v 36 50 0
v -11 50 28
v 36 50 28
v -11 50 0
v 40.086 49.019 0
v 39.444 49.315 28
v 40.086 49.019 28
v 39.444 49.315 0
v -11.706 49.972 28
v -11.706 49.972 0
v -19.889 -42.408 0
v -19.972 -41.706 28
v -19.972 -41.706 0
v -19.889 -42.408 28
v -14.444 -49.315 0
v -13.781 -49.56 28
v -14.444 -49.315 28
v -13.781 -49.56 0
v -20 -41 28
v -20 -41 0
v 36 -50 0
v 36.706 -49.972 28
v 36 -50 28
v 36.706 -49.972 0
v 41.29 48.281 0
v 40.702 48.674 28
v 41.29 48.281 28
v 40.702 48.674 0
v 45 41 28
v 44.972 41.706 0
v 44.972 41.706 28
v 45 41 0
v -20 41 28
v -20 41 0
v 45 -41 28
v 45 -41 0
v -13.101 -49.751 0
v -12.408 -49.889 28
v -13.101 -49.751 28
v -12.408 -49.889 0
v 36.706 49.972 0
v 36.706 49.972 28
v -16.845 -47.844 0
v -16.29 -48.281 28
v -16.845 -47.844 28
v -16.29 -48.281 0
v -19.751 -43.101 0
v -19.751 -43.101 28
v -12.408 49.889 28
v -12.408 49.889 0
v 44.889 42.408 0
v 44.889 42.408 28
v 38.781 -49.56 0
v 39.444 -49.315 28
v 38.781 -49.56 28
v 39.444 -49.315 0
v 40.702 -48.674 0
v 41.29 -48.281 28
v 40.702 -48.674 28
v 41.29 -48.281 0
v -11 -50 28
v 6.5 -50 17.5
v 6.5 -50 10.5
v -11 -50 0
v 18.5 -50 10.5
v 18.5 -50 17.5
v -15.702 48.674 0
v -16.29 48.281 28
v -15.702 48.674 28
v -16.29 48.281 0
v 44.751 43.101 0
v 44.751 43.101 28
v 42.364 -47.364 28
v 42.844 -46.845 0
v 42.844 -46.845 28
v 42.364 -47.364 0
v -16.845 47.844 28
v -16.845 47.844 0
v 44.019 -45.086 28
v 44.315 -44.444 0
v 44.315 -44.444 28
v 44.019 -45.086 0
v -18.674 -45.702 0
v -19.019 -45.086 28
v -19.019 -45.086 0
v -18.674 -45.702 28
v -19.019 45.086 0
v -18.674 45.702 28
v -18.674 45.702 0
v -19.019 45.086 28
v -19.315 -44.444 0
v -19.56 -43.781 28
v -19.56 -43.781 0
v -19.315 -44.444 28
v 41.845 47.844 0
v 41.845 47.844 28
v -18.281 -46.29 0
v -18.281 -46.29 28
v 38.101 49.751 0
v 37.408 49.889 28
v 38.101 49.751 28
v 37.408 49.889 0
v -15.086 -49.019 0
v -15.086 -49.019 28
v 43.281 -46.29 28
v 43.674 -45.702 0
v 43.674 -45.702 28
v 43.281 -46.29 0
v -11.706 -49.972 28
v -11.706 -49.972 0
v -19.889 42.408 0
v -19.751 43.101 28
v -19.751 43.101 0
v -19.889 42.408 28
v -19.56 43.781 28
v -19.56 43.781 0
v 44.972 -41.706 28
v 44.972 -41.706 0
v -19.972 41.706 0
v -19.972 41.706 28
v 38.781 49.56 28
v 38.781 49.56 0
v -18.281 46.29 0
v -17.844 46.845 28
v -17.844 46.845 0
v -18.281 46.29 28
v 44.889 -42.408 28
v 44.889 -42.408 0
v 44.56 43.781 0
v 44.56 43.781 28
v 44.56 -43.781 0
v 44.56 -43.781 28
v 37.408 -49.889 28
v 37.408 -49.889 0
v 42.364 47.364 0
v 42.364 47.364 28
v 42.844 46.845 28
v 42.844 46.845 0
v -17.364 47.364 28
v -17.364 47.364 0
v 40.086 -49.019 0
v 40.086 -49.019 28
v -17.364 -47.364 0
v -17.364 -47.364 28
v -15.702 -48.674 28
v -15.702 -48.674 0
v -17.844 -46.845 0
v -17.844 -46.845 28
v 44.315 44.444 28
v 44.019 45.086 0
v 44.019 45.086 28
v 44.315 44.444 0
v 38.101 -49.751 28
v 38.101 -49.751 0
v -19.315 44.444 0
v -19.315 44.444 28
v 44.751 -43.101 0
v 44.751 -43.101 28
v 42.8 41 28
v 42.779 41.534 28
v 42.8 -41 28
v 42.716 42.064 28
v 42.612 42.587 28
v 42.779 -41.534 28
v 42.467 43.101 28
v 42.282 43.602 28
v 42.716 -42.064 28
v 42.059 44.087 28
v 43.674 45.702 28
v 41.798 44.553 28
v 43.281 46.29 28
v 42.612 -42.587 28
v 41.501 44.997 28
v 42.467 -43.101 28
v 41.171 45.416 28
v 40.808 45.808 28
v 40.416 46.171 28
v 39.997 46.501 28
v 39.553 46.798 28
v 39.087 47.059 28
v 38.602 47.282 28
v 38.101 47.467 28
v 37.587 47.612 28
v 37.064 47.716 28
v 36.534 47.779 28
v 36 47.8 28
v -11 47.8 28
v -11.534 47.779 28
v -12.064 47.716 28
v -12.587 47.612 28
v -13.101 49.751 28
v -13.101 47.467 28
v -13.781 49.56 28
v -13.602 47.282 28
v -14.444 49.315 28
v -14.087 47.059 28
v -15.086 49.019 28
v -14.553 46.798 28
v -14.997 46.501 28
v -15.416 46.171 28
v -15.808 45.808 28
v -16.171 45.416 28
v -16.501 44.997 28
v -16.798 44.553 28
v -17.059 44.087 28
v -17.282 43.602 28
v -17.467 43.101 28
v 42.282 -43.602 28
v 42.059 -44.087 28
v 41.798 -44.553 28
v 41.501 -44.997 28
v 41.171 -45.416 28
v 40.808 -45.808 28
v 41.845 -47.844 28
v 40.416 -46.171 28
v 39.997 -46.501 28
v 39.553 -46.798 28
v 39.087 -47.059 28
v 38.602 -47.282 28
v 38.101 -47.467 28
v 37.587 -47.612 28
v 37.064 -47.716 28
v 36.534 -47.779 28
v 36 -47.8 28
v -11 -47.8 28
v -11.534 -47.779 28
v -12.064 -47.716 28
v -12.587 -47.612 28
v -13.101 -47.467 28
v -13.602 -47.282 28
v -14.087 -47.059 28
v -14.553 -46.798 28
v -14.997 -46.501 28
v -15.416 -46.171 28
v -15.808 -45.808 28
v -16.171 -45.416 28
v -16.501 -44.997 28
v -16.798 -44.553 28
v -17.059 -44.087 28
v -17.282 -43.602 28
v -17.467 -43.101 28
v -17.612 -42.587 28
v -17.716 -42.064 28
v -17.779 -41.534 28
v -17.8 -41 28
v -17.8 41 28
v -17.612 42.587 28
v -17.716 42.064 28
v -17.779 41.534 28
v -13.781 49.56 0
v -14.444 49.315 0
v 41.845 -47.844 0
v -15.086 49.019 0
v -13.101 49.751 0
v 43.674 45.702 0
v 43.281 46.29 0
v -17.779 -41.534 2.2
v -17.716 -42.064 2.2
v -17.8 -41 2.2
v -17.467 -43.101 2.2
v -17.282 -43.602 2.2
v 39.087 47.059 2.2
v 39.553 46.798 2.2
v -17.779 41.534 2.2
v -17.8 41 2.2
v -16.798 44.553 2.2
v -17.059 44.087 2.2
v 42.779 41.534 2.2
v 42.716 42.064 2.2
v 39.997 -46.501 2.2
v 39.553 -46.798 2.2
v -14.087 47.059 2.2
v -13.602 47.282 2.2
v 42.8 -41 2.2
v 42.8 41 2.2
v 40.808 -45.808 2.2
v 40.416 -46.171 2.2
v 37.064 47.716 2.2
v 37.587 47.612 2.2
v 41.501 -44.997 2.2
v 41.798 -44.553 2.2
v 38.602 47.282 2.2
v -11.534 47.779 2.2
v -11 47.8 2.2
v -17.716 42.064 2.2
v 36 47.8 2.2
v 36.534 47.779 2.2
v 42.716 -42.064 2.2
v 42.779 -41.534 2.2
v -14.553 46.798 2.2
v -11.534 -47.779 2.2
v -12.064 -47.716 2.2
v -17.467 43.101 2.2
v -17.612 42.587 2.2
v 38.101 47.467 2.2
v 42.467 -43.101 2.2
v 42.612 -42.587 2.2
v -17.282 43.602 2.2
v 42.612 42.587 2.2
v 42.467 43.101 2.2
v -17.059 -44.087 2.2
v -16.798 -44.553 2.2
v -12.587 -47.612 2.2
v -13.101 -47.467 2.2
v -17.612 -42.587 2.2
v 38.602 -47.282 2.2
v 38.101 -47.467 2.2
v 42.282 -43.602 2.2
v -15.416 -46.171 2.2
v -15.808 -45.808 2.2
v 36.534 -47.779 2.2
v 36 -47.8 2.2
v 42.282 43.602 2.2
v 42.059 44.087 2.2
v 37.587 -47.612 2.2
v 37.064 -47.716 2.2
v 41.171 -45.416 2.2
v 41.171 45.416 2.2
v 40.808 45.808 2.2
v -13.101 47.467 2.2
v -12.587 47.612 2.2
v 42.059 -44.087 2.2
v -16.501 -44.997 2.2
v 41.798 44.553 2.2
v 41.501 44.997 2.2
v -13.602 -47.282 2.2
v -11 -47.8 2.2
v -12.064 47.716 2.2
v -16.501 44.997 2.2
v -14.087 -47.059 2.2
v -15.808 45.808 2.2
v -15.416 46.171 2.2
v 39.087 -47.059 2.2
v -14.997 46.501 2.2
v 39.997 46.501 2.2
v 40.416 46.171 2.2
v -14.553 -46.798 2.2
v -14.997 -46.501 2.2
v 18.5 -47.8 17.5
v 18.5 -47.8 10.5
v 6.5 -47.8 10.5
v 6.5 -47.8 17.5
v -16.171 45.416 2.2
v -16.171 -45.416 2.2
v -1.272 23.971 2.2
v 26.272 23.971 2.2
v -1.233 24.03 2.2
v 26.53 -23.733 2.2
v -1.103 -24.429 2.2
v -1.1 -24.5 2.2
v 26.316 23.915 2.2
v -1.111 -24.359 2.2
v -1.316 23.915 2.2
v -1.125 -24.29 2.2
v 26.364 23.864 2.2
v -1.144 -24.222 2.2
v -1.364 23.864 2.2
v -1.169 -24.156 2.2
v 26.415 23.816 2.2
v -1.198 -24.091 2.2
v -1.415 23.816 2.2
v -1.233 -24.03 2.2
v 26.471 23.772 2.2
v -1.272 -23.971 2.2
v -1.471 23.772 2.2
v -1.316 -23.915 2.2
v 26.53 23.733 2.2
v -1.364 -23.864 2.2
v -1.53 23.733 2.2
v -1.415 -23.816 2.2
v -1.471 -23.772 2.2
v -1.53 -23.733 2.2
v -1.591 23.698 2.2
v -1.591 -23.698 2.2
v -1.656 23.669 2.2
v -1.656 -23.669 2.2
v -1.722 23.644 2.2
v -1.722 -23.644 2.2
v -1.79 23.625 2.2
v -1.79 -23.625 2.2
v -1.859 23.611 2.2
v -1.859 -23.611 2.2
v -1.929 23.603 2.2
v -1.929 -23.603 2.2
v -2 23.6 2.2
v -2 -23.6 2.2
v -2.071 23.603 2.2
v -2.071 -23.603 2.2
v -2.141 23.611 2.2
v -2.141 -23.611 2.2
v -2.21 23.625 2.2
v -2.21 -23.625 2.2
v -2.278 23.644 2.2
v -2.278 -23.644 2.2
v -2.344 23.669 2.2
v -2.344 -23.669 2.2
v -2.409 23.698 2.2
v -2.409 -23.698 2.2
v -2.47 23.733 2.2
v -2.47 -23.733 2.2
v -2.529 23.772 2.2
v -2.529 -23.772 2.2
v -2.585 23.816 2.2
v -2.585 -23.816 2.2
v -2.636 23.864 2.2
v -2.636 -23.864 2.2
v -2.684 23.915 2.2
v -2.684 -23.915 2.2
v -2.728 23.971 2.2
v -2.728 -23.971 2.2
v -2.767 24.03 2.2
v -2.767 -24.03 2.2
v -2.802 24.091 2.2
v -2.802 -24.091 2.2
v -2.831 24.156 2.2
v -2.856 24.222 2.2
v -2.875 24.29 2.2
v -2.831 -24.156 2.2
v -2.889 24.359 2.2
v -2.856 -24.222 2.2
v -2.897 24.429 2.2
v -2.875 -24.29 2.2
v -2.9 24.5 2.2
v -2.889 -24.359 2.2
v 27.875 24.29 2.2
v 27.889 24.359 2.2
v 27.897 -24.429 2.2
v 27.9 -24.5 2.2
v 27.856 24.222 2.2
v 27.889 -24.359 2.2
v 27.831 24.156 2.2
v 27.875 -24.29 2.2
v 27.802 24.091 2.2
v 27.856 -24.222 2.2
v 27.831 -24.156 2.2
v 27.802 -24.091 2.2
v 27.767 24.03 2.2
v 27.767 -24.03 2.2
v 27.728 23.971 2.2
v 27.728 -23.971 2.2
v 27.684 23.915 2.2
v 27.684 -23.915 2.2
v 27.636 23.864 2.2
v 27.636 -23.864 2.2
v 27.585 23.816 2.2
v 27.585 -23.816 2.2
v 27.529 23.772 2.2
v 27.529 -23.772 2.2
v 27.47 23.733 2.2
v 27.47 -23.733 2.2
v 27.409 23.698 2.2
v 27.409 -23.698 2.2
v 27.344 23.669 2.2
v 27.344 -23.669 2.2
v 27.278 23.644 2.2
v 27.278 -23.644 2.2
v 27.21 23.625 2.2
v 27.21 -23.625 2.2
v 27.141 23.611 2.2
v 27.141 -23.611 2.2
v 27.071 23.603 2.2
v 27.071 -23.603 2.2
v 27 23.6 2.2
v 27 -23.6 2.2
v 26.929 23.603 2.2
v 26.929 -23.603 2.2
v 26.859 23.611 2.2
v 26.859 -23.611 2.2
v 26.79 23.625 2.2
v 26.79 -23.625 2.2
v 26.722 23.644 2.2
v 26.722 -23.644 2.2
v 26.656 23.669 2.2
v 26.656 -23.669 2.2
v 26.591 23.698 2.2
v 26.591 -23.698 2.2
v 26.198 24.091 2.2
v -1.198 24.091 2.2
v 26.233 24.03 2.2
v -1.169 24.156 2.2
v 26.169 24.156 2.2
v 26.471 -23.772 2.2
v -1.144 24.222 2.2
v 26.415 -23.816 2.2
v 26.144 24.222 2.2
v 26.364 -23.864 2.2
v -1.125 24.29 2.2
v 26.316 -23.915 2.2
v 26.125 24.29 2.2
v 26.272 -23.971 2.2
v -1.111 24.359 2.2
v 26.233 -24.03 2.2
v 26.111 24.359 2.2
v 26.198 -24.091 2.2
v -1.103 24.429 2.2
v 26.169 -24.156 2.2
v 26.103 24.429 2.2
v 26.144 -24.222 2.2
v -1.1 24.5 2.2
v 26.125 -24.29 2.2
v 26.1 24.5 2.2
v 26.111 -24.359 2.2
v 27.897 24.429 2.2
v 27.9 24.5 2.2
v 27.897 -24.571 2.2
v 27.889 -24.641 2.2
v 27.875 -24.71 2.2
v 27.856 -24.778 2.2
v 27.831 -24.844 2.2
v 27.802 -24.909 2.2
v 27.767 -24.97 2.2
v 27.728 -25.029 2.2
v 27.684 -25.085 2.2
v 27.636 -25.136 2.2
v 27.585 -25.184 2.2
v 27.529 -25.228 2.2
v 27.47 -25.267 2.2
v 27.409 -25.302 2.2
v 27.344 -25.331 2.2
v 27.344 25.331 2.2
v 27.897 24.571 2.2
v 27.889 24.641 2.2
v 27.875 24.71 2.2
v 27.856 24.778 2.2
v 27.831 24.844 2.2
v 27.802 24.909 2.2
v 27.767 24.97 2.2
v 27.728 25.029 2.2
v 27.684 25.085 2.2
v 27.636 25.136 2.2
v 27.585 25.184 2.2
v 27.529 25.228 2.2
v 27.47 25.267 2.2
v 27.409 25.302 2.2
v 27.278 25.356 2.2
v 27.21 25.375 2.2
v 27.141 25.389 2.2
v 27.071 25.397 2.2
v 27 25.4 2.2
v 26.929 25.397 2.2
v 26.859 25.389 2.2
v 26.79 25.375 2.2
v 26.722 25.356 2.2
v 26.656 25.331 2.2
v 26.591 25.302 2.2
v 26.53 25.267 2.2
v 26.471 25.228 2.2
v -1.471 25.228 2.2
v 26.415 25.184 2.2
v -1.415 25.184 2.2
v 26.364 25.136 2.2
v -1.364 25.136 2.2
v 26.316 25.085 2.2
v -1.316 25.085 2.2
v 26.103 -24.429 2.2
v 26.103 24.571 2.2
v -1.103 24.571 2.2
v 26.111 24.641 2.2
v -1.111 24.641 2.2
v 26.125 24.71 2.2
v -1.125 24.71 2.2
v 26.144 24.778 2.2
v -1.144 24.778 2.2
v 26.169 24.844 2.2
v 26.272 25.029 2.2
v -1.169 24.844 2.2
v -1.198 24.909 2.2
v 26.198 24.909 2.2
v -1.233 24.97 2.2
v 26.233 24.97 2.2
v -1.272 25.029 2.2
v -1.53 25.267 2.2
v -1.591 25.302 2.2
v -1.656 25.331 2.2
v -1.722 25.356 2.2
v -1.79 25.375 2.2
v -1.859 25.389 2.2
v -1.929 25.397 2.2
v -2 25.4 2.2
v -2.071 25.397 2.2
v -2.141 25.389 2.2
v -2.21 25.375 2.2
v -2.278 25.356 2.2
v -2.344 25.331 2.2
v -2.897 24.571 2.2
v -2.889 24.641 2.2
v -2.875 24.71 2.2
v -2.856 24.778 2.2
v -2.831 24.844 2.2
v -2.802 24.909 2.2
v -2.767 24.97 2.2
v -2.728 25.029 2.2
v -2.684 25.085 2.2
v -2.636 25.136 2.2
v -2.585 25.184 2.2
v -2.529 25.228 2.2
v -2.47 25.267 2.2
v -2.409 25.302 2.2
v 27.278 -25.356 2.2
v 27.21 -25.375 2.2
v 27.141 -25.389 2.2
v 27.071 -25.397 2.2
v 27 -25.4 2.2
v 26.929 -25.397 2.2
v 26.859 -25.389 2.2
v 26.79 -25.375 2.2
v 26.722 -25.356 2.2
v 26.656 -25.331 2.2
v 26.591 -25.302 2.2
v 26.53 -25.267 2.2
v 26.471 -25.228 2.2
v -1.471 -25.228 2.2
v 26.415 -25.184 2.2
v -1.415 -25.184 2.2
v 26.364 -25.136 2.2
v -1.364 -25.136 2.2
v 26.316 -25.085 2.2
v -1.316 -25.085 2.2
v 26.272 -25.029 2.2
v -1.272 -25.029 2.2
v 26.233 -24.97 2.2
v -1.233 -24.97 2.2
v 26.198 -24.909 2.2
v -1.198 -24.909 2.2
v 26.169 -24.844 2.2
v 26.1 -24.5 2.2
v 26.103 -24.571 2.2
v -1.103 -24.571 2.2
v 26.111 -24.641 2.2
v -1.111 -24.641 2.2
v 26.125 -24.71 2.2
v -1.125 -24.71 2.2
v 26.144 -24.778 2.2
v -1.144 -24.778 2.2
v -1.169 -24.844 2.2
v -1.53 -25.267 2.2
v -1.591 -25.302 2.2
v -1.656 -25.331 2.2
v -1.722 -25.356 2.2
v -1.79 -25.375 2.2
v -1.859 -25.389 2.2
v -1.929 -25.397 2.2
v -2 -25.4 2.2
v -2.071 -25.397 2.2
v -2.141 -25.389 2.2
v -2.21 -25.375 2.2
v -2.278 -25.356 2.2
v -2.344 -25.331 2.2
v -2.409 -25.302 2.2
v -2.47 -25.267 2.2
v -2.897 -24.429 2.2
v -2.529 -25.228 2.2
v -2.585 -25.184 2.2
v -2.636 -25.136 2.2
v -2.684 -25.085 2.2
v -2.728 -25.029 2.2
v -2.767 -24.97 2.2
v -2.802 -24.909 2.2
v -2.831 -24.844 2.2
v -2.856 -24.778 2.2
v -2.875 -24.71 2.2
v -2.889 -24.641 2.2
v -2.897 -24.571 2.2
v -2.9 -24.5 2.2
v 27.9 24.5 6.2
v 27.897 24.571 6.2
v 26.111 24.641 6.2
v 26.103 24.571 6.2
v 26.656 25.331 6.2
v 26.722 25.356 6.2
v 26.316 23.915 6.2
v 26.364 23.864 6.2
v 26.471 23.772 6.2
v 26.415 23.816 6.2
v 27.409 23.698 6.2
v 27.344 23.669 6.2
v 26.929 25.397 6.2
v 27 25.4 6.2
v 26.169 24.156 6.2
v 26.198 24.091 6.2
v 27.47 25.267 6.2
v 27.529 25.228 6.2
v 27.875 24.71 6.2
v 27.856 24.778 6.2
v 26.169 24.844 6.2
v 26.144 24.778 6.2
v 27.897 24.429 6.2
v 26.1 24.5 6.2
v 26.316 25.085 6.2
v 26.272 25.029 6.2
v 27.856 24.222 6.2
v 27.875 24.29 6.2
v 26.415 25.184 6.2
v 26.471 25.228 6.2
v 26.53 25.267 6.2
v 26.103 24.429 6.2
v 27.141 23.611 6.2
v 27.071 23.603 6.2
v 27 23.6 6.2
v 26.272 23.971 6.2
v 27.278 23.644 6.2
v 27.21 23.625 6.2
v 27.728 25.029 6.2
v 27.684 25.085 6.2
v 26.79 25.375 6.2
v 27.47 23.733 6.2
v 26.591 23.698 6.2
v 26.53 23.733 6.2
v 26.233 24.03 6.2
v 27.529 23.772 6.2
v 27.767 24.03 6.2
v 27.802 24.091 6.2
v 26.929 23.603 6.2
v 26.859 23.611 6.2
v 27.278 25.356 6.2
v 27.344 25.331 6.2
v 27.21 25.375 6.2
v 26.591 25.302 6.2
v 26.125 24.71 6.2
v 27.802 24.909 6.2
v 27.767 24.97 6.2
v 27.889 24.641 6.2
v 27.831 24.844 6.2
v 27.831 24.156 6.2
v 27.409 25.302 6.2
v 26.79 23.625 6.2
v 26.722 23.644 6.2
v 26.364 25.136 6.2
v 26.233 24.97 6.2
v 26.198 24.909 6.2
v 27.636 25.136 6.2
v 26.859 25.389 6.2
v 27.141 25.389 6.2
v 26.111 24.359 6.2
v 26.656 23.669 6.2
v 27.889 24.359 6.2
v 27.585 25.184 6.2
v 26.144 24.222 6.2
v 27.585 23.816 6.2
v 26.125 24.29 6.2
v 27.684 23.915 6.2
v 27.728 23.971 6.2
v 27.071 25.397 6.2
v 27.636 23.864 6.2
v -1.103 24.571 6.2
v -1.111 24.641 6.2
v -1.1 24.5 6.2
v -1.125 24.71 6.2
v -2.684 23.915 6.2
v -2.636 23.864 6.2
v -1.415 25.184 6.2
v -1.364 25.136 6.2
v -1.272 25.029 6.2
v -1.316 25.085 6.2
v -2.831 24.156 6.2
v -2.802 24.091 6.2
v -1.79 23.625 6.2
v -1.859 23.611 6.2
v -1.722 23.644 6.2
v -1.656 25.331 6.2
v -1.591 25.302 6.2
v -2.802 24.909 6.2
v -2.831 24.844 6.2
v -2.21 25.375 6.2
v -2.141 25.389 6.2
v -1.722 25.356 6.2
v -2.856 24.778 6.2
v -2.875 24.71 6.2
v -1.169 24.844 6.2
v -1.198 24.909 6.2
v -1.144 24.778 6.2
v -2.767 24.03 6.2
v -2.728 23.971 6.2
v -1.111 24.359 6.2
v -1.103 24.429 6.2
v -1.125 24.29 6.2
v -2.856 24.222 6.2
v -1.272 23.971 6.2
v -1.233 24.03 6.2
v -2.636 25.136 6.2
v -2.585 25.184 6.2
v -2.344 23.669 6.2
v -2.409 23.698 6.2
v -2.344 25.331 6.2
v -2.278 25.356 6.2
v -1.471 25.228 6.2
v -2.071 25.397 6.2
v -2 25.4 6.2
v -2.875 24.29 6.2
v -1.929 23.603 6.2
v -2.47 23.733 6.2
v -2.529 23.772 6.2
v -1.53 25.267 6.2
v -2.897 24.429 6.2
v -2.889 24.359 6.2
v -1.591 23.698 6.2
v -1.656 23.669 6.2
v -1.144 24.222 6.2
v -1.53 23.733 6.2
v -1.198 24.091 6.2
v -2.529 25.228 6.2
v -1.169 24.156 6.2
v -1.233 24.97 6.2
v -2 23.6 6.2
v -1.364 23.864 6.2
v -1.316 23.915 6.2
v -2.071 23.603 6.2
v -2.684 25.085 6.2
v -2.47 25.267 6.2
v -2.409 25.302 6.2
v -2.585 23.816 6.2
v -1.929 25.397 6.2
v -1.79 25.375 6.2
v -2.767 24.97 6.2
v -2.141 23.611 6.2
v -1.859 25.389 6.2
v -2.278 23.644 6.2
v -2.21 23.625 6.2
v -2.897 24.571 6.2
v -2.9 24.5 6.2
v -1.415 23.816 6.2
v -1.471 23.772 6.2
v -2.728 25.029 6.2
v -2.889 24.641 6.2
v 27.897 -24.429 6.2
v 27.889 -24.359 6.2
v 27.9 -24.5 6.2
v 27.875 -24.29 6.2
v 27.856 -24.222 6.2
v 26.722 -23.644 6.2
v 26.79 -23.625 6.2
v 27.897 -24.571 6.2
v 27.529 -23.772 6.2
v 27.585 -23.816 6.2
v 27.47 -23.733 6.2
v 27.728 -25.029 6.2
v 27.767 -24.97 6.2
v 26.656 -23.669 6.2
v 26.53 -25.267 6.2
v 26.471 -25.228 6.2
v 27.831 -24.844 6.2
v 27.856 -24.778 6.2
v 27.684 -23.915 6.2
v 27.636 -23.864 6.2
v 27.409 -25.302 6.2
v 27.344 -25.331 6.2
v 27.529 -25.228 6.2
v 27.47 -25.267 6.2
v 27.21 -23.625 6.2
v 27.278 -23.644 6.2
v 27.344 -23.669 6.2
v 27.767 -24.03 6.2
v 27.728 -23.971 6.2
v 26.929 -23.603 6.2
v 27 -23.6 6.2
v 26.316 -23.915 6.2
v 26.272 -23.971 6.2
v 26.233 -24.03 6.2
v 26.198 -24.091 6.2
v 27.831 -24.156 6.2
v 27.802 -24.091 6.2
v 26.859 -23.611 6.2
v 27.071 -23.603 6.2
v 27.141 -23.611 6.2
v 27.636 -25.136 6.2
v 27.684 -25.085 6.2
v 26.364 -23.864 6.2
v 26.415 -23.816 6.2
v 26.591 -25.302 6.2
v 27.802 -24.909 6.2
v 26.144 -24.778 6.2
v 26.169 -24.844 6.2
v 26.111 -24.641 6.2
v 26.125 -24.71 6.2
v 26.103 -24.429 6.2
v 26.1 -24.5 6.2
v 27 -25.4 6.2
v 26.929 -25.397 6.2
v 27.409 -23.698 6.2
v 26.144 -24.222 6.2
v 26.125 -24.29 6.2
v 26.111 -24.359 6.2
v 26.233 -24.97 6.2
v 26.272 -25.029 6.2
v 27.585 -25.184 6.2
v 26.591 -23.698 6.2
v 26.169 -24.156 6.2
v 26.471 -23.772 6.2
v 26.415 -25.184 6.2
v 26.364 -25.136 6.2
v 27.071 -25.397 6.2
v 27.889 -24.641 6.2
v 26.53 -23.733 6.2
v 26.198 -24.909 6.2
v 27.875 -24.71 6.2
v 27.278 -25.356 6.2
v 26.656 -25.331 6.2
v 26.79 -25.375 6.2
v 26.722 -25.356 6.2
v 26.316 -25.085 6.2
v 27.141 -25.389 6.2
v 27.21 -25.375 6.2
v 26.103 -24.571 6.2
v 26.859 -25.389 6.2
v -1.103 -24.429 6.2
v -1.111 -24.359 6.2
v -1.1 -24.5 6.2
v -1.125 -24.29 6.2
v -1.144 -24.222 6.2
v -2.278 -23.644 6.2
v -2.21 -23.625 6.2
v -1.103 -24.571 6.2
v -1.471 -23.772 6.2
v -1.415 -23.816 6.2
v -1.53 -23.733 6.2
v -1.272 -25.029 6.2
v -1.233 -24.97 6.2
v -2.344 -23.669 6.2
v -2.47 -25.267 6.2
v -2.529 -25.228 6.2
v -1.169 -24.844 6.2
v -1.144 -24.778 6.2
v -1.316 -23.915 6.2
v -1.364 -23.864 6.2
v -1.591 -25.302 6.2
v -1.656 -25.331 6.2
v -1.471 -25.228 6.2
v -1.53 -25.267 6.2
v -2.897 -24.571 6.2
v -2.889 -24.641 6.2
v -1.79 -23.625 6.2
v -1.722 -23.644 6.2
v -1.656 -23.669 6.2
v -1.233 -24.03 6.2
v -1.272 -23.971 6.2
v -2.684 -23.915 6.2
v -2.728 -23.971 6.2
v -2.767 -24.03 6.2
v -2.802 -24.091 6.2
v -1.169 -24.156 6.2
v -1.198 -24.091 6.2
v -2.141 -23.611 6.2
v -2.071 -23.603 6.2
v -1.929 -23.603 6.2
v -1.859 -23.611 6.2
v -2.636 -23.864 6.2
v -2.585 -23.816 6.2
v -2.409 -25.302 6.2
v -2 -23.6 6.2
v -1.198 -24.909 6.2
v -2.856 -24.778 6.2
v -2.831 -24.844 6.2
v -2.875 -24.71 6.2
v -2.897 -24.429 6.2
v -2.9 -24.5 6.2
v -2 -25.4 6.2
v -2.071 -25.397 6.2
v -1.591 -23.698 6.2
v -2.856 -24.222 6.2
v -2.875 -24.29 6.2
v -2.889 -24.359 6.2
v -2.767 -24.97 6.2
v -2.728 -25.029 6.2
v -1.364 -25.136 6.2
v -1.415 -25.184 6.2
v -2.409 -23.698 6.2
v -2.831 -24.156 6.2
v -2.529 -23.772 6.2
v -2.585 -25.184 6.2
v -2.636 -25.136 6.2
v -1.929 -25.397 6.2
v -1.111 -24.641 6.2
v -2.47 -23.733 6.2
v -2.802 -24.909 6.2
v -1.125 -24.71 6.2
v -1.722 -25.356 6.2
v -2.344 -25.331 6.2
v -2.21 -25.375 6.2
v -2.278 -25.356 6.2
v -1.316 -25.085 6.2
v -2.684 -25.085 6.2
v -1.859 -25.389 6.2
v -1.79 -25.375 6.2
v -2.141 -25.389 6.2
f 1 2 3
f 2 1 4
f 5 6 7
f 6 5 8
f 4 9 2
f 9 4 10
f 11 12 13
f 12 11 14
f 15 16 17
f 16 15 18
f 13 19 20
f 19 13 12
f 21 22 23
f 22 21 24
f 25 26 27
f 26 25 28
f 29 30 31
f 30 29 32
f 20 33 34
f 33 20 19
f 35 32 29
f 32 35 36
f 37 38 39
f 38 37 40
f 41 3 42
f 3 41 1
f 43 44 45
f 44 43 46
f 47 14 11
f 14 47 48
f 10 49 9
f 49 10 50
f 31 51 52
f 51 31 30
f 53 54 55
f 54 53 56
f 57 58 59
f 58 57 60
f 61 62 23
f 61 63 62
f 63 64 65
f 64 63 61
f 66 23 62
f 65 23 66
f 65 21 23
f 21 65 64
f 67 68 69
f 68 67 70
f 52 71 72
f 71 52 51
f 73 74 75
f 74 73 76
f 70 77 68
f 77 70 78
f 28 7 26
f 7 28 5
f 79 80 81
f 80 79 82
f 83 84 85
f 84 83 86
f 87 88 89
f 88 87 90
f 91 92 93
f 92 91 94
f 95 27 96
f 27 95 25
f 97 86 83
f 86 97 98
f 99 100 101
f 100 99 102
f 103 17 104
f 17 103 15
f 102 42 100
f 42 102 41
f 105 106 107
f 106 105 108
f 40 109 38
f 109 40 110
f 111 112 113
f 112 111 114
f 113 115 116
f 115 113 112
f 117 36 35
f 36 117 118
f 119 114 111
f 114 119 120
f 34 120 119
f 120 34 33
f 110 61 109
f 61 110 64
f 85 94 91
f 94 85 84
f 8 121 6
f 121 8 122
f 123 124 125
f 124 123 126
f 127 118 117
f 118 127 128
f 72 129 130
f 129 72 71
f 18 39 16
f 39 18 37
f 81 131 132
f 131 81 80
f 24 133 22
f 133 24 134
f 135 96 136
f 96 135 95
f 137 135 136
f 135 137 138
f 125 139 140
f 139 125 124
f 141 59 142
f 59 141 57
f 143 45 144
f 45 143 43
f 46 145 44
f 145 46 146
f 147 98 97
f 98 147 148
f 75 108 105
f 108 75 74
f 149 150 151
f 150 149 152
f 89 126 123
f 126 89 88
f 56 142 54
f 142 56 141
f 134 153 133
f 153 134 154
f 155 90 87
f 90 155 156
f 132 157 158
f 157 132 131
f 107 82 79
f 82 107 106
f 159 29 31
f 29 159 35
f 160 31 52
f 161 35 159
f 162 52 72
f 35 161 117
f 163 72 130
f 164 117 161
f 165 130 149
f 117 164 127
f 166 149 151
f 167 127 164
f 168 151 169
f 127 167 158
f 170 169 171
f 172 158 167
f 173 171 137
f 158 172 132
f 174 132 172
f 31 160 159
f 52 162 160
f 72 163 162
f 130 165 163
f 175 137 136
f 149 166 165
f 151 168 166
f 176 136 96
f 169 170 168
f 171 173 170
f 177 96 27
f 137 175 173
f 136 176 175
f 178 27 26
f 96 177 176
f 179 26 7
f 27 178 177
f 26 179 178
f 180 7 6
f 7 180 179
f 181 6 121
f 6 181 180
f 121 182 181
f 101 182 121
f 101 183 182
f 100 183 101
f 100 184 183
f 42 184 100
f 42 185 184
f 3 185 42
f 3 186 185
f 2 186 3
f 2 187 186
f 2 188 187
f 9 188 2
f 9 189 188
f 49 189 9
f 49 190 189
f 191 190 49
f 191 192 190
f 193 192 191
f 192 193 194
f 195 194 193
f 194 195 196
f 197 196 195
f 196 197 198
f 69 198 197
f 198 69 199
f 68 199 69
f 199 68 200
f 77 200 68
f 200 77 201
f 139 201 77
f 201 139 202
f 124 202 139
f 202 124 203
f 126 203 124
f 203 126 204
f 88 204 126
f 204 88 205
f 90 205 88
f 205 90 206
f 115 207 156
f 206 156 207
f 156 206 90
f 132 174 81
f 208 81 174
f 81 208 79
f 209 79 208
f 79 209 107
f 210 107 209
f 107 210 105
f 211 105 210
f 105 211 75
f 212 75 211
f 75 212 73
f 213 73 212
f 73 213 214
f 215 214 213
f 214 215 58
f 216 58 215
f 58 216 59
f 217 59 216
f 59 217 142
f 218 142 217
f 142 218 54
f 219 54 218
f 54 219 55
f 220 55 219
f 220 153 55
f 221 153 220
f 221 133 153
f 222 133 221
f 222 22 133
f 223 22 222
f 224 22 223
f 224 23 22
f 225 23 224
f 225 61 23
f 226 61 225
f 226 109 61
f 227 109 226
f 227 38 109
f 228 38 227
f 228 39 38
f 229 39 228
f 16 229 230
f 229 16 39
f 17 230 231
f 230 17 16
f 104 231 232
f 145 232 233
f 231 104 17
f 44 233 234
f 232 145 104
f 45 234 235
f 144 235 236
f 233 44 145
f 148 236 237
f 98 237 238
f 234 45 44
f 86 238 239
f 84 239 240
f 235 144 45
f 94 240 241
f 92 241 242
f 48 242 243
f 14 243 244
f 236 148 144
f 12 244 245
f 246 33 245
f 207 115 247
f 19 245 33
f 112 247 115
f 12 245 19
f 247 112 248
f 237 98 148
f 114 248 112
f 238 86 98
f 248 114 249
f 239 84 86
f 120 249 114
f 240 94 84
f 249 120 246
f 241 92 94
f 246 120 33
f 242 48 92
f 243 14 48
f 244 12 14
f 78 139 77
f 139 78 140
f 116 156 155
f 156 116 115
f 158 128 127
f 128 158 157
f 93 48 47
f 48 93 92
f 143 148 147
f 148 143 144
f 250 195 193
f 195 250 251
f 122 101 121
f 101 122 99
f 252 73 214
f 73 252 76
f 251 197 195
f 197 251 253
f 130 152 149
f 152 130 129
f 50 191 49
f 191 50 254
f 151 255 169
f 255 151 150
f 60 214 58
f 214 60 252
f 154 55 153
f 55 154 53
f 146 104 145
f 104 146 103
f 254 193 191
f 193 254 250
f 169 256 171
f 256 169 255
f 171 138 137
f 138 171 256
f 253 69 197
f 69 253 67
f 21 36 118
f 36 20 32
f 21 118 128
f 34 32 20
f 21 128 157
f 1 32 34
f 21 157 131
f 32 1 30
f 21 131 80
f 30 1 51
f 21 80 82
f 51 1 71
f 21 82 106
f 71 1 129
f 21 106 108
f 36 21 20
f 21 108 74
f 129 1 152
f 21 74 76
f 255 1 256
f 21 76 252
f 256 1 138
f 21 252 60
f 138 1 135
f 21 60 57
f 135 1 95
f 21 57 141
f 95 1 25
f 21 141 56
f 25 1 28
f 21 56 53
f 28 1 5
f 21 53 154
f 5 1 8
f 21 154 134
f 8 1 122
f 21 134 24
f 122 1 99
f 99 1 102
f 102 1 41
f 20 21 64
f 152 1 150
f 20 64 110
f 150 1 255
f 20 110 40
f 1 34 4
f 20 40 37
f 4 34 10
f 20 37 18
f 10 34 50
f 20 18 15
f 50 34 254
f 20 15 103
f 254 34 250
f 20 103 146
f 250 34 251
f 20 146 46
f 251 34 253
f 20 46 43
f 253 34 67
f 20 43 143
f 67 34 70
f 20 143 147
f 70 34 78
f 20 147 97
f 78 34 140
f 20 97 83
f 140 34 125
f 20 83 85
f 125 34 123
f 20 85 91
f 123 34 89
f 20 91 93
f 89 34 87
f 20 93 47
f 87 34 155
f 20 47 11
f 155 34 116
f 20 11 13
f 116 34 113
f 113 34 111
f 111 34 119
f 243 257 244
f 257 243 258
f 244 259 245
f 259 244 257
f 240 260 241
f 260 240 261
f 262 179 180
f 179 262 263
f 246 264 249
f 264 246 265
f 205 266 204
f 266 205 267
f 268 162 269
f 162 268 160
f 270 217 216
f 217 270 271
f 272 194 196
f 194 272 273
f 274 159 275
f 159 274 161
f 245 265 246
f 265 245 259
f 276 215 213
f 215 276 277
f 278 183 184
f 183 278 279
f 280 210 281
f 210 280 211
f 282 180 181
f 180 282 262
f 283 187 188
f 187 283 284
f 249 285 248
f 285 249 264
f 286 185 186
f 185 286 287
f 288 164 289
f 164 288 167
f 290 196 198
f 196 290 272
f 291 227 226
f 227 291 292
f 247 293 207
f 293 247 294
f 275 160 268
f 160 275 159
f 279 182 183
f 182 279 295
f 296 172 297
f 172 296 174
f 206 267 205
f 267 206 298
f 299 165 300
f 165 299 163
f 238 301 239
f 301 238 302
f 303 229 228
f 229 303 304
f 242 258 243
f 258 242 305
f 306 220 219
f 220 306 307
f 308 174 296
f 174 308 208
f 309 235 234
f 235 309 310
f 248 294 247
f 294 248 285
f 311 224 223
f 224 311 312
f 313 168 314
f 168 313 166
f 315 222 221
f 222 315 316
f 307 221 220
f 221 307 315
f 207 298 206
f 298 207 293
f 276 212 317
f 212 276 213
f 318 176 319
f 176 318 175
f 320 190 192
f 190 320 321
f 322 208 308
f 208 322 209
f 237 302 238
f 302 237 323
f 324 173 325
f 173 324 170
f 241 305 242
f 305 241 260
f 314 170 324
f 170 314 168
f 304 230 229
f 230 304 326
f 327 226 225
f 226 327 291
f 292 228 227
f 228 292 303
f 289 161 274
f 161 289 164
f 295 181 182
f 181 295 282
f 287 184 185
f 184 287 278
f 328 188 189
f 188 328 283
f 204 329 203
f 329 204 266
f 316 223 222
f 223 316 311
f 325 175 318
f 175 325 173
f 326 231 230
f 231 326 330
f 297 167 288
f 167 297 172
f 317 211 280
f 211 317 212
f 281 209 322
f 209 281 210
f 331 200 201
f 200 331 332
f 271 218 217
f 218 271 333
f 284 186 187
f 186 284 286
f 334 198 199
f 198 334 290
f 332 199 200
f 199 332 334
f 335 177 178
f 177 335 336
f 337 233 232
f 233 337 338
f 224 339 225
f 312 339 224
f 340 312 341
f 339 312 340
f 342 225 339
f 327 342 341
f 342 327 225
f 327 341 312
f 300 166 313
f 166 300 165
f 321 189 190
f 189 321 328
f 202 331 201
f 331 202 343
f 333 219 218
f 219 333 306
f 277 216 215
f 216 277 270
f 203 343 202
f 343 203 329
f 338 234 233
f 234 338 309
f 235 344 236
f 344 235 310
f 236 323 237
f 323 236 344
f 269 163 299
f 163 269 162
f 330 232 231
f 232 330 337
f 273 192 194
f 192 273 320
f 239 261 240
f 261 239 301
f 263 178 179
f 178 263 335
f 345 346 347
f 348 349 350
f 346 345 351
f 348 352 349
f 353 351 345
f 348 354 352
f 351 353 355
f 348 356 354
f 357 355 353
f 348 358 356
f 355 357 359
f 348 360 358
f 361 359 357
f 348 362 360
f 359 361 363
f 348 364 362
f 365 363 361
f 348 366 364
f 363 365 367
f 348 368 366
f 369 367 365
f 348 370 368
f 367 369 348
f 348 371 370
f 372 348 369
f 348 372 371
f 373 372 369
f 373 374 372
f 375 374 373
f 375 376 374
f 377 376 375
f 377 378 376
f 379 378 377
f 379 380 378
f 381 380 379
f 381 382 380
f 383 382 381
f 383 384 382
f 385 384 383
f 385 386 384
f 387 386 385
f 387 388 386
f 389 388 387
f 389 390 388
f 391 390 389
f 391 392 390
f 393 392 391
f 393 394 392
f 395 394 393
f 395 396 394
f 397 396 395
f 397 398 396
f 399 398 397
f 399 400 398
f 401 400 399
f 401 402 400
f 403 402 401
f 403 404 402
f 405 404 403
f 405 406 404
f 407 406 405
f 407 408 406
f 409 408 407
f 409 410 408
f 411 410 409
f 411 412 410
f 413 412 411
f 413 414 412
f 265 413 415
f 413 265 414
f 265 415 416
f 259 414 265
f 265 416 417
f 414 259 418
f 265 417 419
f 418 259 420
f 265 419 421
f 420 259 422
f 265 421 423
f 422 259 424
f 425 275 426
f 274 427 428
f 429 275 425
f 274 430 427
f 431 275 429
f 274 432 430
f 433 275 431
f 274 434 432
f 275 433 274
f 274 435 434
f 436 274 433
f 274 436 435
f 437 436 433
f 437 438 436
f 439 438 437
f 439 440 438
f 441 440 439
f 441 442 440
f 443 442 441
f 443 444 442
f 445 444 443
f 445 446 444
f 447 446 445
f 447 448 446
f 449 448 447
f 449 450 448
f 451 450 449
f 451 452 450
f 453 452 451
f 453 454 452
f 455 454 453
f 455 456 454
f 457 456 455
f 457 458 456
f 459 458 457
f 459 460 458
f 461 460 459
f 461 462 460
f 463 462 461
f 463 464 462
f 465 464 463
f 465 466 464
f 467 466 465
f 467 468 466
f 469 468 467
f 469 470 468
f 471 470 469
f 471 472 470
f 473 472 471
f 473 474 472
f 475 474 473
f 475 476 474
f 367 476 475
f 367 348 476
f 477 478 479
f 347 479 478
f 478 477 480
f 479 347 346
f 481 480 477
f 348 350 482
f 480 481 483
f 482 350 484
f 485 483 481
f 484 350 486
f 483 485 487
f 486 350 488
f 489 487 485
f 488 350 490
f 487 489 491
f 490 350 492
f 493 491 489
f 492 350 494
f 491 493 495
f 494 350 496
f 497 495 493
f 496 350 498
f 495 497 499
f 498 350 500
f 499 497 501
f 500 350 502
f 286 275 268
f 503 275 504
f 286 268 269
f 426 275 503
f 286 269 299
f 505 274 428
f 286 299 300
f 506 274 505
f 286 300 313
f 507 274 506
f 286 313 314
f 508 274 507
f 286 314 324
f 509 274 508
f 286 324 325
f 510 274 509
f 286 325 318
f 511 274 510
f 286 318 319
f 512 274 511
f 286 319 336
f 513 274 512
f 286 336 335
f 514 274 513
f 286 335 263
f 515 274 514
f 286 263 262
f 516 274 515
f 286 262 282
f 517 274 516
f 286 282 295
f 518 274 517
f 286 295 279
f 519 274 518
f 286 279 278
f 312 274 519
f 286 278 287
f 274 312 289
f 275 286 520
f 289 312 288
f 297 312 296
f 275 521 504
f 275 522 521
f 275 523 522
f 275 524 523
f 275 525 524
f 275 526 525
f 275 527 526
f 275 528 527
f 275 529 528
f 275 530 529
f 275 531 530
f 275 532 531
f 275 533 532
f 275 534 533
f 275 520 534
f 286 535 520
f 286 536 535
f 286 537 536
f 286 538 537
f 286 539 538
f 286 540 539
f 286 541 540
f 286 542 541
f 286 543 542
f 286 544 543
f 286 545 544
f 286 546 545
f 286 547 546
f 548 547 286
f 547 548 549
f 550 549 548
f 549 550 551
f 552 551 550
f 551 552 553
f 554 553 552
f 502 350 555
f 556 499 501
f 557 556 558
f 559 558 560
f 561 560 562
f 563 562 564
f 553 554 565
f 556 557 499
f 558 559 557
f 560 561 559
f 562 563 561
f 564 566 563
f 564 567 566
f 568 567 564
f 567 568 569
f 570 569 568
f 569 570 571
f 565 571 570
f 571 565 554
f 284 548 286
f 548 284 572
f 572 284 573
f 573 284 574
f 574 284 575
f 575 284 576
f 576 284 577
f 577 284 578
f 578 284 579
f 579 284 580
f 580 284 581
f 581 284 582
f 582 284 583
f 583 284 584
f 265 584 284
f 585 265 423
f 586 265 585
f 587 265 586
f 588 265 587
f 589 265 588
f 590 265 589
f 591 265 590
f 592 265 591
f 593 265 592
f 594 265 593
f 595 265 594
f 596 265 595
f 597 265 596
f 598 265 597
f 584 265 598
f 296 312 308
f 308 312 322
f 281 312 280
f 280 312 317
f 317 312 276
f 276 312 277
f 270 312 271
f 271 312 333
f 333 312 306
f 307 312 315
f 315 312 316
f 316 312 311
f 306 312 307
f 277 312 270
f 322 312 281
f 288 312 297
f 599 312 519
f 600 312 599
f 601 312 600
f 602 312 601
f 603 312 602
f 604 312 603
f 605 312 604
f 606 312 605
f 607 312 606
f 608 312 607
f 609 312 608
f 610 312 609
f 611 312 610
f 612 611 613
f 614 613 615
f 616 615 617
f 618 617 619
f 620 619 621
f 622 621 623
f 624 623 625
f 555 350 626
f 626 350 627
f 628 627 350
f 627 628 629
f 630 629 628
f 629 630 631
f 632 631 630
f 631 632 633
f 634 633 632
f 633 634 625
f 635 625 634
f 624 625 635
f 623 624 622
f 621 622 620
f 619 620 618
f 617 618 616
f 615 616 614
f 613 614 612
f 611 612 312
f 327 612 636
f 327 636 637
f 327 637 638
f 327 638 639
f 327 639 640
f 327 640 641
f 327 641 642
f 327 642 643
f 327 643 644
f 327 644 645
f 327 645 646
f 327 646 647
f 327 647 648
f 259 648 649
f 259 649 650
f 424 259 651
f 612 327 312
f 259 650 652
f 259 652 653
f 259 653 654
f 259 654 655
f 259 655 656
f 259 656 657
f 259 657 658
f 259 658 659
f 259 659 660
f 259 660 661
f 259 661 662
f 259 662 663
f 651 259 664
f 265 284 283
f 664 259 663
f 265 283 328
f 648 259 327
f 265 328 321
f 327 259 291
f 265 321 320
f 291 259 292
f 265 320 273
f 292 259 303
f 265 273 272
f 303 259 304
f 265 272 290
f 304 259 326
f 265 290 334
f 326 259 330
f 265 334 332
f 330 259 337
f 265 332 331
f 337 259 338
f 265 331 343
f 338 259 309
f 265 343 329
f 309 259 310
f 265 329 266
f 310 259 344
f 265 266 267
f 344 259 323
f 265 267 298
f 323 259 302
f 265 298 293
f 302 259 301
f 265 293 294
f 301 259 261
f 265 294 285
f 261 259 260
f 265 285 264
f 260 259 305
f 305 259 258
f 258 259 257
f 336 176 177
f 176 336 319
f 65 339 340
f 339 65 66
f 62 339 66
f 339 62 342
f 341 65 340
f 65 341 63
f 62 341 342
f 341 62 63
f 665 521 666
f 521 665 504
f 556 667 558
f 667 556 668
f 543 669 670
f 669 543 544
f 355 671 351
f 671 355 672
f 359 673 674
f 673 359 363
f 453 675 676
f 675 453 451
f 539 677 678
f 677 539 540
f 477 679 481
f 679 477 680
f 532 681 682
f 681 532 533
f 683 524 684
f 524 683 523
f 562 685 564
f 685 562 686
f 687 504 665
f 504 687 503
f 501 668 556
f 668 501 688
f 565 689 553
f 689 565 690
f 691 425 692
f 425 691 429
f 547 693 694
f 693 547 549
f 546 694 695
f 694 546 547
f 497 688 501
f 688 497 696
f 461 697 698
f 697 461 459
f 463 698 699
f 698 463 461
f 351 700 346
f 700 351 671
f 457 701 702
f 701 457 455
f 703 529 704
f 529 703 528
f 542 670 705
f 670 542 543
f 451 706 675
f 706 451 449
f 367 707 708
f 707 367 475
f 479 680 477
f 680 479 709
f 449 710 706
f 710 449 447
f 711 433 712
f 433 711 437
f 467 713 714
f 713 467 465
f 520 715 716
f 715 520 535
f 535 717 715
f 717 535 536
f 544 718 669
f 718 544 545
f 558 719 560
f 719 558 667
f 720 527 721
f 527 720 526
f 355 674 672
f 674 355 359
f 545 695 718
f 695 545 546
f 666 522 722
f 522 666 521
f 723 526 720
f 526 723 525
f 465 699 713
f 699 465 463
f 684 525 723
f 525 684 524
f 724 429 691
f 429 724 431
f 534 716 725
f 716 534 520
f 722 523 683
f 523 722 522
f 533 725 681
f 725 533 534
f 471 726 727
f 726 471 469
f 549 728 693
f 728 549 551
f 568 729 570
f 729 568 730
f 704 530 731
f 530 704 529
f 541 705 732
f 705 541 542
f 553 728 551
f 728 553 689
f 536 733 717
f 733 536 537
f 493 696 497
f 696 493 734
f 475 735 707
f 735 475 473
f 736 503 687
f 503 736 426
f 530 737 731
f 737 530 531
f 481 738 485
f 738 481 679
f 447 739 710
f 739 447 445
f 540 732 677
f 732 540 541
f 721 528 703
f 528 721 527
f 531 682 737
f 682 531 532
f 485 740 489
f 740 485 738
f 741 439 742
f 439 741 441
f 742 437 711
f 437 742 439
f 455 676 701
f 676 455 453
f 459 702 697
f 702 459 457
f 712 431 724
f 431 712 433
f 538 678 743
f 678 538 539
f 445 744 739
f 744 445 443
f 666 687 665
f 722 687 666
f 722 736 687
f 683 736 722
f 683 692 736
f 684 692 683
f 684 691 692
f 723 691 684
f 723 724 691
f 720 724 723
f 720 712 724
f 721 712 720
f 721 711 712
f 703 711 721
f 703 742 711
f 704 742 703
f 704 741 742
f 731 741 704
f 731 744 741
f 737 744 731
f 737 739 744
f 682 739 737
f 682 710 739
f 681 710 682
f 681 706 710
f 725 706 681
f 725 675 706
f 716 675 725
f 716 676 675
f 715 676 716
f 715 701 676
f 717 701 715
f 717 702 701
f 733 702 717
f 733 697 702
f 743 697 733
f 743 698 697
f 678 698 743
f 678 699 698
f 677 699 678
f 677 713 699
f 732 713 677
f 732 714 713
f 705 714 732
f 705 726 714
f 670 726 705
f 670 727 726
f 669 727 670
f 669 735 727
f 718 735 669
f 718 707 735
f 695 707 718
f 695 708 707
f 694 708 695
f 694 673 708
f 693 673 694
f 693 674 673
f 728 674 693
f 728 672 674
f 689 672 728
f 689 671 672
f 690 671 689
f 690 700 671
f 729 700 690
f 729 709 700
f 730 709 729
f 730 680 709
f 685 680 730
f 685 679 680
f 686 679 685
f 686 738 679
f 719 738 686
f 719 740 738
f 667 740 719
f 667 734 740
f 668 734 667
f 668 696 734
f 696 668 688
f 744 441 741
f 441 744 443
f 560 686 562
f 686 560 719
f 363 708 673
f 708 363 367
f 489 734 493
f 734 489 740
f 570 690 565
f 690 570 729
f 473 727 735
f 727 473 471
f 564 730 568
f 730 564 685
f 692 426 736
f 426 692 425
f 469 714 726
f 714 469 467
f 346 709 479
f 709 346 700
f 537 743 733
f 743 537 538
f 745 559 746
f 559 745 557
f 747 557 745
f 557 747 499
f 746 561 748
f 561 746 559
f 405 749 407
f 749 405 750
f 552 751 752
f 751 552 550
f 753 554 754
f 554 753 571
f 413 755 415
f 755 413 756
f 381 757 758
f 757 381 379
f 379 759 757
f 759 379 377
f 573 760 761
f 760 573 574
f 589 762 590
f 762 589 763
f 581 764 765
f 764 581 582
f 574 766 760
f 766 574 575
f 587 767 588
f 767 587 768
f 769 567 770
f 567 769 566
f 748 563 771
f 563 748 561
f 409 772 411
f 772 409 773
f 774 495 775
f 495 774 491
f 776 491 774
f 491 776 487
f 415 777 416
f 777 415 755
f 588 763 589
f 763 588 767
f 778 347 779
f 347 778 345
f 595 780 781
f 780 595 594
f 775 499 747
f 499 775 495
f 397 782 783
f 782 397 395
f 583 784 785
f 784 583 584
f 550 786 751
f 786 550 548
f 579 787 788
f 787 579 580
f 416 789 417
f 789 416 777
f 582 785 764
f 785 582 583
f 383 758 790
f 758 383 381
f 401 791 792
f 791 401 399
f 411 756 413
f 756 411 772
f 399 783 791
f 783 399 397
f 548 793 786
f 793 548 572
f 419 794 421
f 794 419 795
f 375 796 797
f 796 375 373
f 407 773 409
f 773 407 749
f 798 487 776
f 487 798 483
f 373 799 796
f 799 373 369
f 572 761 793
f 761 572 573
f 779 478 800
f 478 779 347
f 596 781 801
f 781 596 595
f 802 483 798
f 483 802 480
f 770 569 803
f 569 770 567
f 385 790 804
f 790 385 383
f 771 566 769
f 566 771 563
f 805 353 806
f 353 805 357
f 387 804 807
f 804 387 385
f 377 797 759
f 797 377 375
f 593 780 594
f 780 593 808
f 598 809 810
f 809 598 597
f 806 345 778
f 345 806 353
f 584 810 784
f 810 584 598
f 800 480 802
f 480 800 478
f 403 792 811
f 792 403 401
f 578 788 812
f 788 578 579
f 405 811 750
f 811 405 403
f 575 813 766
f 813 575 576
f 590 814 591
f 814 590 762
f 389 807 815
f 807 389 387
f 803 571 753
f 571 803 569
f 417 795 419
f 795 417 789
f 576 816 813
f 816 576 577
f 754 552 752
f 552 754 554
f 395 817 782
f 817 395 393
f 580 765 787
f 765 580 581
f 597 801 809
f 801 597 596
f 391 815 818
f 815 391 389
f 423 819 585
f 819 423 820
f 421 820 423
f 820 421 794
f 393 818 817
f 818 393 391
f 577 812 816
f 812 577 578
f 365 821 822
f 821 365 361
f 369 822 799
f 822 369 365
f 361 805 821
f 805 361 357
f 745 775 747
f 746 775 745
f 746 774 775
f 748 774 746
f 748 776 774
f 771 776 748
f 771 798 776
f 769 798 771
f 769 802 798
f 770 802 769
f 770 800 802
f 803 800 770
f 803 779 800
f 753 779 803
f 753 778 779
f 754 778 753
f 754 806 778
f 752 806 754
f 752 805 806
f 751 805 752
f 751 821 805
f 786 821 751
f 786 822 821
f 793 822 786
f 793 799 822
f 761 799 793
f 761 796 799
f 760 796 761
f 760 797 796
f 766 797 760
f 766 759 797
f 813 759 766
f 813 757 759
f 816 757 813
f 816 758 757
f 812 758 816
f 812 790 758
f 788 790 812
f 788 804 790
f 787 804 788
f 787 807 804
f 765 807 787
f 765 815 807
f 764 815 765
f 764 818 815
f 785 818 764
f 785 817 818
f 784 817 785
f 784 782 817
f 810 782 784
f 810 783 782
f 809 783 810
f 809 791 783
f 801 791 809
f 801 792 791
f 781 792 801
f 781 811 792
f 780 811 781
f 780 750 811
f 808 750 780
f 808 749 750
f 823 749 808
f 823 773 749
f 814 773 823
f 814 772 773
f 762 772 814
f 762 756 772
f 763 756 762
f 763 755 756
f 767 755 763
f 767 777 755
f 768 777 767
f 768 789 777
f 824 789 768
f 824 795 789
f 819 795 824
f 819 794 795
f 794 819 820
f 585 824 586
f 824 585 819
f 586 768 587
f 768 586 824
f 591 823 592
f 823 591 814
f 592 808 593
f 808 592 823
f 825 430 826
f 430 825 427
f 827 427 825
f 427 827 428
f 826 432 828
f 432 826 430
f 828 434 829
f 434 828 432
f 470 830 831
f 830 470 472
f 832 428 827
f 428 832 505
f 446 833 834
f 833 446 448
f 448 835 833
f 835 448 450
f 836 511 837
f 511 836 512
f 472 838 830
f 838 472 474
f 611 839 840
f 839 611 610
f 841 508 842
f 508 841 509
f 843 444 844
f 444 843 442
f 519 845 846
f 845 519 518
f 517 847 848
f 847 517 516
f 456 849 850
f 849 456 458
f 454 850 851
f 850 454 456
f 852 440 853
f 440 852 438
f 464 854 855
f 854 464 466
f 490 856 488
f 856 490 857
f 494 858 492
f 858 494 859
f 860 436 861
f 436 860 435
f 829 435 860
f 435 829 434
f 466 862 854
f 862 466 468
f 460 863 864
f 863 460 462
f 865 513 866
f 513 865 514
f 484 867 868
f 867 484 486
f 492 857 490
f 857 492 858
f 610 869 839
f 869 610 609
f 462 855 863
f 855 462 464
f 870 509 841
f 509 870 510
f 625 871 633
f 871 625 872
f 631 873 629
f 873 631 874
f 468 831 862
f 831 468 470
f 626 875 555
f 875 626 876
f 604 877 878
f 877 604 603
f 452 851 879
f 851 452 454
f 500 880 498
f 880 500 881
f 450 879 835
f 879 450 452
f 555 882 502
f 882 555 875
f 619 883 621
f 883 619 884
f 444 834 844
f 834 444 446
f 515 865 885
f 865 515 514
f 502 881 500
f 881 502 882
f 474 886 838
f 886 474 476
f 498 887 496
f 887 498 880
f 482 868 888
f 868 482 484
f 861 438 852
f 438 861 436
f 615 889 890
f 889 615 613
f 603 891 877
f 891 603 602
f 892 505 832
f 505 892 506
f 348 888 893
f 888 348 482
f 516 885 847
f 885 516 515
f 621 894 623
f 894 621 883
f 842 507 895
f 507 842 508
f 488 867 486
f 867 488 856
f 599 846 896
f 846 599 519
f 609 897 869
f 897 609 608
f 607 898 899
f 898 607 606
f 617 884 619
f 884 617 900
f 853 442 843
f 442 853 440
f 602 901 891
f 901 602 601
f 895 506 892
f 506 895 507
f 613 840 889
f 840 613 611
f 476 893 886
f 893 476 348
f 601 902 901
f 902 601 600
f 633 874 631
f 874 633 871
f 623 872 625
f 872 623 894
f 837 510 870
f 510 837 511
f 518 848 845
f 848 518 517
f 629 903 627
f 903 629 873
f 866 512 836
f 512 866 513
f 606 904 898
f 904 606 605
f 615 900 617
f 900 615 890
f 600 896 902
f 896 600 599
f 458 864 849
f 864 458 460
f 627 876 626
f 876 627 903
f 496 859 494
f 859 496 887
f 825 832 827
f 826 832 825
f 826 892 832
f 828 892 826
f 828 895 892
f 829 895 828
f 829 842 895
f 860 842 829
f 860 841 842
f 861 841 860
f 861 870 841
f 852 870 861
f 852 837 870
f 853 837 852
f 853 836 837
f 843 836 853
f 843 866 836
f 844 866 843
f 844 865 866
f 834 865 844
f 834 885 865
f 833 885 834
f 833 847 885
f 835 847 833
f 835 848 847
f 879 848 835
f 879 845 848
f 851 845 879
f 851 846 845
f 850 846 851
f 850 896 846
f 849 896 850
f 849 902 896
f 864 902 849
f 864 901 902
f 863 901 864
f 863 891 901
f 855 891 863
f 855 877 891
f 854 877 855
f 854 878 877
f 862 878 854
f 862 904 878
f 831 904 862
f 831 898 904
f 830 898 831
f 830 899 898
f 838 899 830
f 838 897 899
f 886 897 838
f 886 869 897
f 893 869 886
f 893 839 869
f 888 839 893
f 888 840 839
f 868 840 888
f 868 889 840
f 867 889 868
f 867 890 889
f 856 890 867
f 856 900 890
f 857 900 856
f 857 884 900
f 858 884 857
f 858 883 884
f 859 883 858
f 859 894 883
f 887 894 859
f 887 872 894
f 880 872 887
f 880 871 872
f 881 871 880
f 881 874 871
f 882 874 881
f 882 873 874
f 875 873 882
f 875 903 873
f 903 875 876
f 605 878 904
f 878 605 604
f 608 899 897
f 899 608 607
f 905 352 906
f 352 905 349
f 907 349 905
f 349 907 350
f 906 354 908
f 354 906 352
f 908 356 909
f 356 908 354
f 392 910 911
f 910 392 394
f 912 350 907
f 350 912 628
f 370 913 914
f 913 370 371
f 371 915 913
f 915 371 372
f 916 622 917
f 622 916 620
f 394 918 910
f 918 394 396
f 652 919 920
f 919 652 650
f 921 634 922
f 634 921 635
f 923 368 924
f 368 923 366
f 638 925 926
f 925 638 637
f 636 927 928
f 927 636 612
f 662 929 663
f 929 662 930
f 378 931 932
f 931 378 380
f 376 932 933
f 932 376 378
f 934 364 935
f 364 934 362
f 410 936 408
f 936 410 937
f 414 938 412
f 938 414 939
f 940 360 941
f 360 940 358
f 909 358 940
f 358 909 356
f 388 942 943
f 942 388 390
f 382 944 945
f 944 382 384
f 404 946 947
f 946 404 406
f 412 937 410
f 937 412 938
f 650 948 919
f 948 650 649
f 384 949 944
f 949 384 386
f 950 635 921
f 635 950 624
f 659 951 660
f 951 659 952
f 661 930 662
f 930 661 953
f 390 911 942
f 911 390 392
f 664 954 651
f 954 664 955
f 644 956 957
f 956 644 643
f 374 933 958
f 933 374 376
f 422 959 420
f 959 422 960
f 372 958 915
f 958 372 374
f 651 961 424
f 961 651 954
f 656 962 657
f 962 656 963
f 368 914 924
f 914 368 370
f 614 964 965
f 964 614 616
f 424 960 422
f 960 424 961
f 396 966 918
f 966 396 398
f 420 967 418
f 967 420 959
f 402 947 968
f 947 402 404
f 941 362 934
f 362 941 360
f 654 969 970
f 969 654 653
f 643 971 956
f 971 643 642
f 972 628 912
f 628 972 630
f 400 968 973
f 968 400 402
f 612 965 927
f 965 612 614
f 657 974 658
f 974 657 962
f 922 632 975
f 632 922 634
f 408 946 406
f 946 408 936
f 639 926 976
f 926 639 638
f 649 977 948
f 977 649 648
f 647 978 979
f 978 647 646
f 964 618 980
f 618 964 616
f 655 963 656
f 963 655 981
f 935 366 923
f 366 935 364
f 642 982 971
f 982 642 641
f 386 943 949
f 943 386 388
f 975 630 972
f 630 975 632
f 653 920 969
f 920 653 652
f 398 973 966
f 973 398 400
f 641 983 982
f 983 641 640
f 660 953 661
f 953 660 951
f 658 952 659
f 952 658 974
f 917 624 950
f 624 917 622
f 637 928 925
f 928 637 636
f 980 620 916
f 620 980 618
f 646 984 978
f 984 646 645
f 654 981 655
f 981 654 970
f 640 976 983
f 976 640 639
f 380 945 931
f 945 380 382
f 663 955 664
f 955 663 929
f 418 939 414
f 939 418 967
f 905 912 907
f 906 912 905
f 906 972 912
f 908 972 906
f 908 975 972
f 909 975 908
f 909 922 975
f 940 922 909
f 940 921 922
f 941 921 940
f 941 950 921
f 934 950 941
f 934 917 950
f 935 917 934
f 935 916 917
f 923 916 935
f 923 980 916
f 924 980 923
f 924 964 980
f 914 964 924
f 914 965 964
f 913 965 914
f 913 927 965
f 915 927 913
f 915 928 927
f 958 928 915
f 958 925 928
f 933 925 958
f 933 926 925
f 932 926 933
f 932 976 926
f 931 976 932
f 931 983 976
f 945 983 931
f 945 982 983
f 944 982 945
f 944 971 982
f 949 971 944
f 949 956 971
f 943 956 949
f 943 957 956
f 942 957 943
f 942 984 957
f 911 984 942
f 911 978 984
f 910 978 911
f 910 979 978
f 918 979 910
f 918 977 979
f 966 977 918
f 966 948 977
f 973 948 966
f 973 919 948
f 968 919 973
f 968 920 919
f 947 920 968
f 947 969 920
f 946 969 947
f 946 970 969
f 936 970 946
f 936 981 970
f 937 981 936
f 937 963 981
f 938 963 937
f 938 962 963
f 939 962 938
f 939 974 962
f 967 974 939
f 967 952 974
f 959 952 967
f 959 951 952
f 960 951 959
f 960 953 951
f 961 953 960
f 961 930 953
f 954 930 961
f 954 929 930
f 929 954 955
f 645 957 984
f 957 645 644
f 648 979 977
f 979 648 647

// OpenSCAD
$fn = 80;
// -------- CHOIX DE LA PIECE --------
part = "base";
// -------- BOITIER PRINCIPAL --------
box_L = 65;
box_W = 100;
box_H = 28;
corner_r = 9;
wall     = 2.2;
floor_t  = 2.2;
offset_x = 12.5;
// -------- USB-C XIAO (face avant Y-) --------
usb_w = 12;
usb_h = 7;
usb_x = 0;       // centré en X sur la petite face
usb_z = 14;
// -------- DIMENSIONS PCB --------
pcb_L = 34;
pcb_W = 54;
pcb_corner = 2.5;
hole_dx = pcb_L - 2 * pcb_corner;
hole_dy = pcb_W - 2 * pcb_corner;
// -------- SUPPORTS PCB --------
pcb_x = 0;
pcb_y = 0;
peg_d = 1.8;
peg_h = 4.0;
// -------- OUTILS --------
module rr2d(L, W, r){
  r2 = min(r, min(L,W)/2 - 0.01);
  hull(){
    translate([ L/2 - r2,  W/2 - r2]) circle(r=r2);
    translate([-L/2 + r2,  W/2 - r2]) circle(r=r2);
    translate([ L/2 - r2, -W/2 + r2]) circle(r=r2);
    translate([-L/2 + r2, -W/2 + r2]) circle(r=r2);
  }
}
module rr3d(L, W, H, r){
  linear_extrude(height=H) rr2d(L,W,r);
}
// -------- SUPPORTS PCB (4 coins) --------
module pcb_mount(){
  positions = [
    [ hole_dx/2,  hole_dy/2],
    [-hole_dx/2,  hole_dy/2],
    [ hole_dx/2, -hole_dy/2],
    [-hole_dx/2, -hole_dy/2]
  ];
  for (p = positions){
    translate([pcb_x + p[0], pcb_y + p[1], floor_t])
      cylinder(d=peg_d, h=peg_h);
  }
}
// -------- BASE COMPLÈTE --------
module base_open(){
  difference(){
    rr3d(box_L, box_W, box_H, corner_r);
    // Cavité intérieure
    translate([0,0,floor_t])
      rr3d(box_L-2*wall, box_W-2*wall,
           box_H-floor_t+0.3,
           max(corner_r-wall,1));
    // TROU USB-C (face avant Y-, centré en X)
    translate([usb_x, -box_W/2 - 0.01, usb_z])
      cube([usb_w, wall+6, usb_h], center=true);
  }
  // 4 plots de support PCB
  pcb_mount();
}
// -------- BASE DÉCALÉE --------
module base_open_shifted(){
  translate([offset_x,0,0])
    base_open();
}
// -------- RENDU FINAL --------
base_open_shifted();
